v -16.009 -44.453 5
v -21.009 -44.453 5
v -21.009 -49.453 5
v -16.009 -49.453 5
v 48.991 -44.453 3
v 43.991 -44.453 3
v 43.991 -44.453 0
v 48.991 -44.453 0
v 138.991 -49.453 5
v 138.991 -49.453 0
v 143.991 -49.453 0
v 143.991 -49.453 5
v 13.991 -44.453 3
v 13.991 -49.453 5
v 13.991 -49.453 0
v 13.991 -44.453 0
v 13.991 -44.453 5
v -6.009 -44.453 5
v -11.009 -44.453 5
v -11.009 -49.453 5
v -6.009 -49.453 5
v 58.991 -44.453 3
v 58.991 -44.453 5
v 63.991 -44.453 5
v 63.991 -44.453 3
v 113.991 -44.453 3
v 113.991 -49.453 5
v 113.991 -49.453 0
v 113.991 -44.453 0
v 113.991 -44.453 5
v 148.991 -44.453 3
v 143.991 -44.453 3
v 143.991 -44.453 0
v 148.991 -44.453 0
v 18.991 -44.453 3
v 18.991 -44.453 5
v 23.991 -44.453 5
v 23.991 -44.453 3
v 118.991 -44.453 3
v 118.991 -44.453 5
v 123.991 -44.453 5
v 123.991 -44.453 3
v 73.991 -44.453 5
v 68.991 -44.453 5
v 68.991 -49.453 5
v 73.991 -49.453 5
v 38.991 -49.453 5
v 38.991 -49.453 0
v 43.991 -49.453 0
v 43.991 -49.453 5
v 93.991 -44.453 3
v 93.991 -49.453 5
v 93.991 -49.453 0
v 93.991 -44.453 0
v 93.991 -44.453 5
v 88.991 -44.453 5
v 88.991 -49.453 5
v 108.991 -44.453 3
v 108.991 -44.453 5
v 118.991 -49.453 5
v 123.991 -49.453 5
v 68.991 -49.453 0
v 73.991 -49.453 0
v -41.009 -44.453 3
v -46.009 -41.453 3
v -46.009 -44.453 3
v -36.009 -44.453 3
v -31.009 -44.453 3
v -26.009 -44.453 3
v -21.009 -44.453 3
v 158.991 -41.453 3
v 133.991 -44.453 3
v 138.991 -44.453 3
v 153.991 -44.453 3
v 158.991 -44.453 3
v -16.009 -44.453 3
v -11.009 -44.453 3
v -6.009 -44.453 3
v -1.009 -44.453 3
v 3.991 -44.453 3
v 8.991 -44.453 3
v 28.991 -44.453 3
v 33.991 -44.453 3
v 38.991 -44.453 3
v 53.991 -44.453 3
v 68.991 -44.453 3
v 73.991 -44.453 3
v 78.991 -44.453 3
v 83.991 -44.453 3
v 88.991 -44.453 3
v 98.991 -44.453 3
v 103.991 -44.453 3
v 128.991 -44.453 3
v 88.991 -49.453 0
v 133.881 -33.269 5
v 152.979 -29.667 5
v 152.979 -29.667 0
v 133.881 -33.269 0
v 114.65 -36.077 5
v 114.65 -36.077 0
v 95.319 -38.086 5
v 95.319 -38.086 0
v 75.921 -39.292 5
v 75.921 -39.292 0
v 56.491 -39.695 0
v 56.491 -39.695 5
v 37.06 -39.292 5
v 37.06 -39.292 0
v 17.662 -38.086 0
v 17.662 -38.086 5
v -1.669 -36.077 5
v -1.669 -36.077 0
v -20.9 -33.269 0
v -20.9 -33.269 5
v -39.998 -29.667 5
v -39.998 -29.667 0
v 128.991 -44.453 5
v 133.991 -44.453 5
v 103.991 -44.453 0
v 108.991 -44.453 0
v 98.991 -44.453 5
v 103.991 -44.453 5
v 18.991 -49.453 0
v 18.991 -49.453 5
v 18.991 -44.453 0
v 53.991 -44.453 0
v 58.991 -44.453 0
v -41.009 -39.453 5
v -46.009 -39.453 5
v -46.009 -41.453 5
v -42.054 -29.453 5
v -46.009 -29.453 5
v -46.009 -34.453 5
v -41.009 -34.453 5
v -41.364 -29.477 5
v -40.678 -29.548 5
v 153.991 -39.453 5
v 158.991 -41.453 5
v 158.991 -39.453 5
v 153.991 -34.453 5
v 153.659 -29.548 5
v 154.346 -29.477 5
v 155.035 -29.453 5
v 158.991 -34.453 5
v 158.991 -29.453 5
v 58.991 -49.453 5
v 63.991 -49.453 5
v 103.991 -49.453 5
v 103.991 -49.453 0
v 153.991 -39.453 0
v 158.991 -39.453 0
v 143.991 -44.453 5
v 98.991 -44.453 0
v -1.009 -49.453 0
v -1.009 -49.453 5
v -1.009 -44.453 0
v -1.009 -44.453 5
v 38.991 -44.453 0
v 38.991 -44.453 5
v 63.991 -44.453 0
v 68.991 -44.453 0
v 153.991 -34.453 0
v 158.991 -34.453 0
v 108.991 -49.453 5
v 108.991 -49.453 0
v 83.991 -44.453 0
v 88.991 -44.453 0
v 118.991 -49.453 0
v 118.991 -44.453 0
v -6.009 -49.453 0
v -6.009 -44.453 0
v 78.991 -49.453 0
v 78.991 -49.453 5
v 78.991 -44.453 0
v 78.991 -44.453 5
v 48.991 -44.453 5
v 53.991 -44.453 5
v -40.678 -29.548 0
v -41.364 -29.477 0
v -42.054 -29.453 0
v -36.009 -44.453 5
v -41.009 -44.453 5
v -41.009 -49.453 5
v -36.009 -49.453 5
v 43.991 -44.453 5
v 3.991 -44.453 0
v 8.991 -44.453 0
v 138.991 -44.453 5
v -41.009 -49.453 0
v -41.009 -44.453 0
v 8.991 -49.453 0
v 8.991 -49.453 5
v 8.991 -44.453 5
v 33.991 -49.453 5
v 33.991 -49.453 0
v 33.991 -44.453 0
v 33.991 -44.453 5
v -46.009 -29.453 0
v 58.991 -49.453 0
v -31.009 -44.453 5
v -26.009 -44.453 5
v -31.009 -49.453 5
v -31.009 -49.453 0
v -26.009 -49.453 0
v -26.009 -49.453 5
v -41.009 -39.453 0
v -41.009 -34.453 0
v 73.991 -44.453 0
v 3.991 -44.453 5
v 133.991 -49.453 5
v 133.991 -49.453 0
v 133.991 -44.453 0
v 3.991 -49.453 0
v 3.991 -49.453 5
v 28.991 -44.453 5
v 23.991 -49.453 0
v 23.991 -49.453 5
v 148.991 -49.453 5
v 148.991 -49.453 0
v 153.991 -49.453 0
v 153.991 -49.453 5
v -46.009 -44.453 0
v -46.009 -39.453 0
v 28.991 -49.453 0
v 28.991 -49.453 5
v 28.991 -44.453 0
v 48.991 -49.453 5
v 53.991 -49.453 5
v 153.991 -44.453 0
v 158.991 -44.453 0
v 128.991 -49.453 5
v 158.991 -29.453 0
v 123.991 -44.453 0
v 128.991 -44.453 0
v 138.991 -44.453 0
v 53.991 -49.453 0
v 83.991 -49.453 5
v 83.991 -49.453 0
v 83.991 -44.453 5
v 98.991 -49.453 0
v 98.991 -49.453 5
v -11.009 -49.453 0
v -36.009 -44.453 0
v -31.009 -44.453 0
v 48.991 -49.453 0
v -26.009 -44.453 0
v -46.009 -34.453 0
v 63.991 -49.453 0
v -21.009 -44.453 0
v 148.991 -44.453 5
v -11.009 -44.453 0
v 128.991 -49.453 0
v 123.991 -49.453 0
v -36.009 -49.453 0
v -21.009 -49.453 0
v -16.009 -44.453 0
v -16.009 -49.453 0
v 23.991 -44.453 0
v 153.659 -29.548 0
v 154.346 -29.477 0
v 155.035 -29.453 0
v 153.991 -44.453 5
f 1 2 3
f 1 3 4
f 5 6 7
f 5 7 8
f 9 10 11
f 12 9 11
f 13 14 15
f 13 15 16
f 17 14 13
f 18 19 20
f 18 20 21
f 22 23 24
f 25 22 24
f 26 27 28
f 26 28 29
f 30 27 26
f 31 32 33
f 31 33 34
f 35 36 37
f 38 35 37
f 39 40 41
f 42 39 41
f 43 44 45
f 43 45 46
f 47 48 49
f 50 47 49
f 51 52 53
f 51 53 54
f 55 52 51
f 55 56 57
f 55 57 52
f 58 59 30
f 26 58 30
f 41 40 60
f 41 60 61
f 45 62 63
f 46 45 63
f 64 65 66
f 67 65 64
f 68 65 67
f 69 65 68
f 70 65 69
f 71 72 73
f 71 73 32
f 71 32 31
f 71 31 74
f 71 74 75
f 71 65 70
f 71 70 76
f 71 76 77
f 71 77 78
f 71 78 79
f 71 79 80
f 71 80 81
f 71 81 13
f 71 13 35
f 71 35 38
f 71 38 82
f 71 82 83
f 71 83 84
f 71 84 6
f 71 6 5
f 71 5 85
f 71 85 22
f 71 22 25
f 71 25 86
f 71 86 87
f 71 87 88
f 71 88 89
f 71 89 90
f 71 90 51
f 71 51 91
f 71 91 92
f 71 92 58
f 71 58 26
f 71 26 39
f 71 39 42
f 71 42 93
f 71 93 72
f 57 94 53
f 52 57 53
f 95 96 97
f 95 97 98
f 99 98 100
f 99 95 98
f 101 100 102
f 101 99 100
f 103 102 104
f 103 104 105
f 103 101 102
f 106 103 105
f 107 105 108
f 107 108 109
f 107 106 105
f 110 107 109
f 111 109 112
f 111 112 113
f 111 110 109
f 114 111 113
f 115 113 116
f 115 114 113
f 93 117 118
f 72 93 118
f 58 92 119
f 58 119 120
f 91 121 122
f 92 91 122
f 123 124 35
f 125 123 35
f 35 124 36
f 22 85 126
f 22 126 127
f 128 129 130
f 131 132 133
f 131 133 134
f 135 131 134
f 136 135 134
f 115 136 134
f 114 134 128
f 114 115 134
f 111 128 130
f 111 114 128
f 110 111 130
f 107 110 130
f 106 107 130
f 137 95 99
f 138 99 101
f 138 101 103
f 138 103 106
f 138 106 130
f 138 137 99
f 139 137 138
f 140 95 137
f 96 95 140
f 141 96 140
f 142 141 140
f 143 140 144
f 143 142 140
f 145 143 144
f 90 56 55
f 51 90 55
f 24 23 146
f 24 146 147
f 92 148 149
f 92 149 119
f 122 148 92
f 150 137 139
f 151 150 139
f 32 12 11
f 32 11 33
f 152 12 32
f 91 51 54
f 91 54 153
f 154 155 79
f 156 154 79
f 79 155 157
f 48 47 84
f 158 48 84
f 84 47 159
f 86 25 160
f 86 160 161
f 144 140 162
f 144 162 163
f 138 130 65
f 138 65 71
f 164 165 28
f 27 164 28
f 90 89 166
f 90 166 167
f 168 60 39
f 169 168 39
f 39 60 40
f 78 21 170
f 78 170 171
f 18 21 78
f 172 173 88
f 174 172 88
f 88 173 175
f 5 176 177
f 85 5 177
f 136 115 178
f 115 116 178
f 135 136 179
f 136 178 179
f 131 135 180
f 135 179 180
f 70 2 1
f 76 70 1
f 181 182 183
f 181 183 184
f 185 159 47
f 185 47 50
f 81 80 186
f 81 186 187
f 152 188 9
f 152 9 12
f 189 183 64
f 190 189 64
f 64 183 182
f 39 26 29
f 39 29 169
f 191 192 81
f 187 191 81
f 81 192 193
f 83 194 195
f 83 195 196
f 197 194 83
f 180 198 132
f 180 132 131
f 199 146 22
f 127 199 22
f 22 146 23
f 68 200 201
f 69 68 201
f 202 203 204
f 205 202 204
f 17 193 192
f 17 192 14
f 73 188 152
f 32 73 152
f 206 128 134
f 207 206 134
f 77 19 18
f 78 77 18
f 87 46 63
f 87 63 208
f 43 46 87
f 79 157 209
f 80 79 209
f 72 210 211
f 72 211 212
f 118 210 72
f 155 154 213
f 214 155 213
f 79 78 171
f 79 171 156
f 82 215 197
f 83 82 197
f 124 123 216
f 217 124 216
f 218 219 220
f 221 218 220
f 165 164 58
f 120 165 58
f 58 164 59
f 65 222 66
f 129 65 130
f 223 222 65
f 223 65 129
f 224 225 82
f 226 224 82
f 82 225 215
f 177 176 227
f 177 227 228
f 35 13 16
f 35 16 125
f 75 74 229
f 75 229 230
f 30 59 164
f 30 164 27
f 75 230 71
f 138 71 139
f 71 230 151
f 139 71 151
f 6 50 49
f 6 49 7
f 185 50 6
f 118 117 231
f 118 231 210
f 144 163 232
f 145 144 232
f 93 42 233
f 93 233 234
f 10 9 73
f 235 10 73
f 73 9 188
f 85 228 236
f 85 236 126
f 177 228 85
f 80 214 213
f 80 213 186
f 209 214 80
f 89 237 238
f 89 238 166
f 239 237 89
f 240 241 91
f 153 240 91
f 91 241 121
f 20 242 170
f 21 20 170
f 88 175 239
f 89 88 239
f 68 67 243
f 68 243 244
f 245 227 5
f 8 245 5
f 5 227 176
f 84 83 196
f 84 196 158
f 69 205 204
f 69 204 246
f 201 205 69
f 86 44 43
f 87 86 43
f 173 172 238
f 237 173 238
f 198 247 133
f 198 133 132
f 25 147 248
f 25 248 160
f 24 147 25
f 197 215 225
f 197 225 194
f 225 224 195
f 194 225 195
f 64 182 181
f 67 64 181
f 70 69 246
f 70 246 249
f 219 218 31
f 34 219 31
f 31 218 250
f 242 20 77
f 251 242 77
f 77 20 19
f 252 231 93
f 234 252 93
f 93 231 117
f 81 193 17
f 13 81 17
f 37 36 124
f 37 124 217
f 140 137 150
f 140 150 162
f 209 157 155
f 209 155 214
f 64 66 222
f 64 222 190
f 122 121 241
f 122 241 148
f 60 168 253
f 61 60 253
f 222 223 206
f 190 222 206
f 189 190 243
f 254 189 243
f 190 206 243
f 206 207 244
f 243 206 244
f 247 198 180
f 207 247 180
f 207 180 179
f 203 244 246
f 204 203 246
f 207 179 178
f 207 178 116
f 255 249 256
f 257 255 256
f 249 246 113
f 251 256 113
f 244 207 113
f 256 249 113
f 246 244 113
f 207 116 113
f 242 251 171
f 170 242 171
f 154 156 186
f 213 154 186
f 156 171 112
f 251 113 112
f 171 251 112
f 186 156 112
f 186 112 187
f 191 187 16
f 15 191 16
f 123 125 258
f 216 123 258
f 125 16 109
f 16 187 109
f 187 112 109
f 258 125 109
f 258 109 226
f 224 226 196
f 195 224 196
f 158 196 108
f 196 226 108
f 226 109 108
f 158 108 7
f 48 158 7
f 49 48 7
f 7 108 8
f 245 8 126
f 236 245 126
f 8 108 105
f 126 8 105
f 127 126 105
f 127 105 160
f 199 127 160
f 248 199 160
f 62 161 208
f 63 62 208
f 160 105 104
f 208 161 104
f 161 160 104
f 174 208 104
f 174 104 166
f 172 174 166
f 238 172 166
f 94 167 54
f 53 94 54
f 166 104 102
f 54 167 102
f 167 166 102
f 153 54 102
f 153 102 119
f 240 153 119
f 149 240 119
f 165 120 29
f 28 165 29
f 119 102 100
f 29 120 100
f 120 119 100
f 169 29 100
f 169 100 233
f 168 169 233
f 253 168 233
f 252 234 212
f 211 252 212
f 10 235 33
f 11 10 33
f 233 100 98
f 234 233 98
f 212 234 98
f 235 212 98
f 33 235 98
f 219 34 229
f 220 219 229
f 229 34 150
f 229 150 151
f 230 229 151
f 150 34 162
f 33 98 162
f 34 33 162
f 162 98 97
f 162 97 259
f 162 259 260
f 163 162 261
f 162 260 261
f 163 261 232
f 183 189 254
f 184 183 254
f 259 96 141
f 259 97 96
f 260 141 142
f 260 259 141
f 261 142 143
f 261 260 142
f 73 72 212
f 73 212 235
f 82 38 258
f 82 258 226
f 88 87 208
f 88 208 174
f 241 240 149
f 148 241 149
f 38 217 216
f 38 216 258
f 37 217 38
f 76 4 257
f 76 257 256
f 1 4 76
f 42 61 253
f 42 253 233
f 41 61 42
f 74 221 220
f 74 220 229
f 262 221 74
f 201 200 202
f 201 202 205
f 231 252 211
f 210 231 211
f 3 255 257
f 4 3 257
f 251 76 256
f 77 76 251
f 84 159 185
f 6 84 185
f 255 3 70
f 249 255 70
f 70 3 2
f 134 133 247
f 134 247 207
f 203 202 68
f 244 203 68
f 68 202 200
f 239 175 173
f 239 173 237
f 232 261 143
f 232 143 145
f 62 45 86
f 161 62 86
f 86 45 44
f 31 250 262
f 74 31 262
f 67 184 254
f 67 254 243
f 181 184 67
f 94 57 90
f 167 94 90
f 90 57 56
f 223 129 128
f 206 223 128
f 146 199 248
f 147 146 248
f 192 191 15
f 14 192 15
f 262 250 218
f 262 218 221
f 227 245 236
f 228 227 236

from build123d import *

# Parameters (mm, degrees)
ESQUISSE1_W             = 205
ESQUISSE1_H             = 20
BOSS_EXTRU_1_DEPTH      = 5
ESQUISSE2_W             = 5
ESQUISSE2_H             = 5
ENL_V_MAT_EXTRU_2_DEPTH = 5
ESQUISSE3_W             = 205
ESQUISSE3_H             = 3
ENL_V_MAT_EXTRU_3_DEPTH = 2
CONG_2_R                = 10
CONG_3_R                = 10


with BuildPart() as part:
    # Esquisse1 → Boss.-Extru.1 (new body)
    with BuildSketch(Plane.XY):
        with Locations((56.490511124, -39.453030303)):
            Rectangle(ESQUISSE1_W, ESQUISSE1_H)
    extrude(amount=BOSS_EXTRU_1_DEPTH)

    # Esquisse2 → Enlèv. mat.-Extru.2 (cut)
    with BuildSketch(Plane.XY.offset(5)):
        with Locations((146.490511124, -46.953030303)):
            Rectangle(ESQUISSE2_W, ESQUISSE2_H)
        with Locations((156.490511124, -46.953030303)):
            Rectangle(ESQUISSE2_W, ESQUISSE2_H)
        with Locations((136.490511124, -46.953030303)):
            Rectangle(ESQUISSE2_W, ESQUISSE2_H)
        with Locations((126.490511124, -46.953030303)):
            Rectangle(ESQUISSE2_W, ESQUISSE2_H)
        with Locations((116.490511124, -46.953030303)):
            Rectangle(ESQUISSE2_W, ESQUISSE2_H)
        with Locations((106.490511124, -46.953030303)):
            Rectangle(ESQUISSE2_W, ESQUISSE2_H)
        with Locations((96.490511124, -46.953030303)):
            Rectangle(ESQUISSE2_W, ESQUISSE2_H)
        with Locations((86.490511124, -46.953030303)):
            Rectangle(ESQUISSE2_W, ESQUISSE2_H)
        with Locations((76.490511124, -46.953030303)):
            Rectangle(ESQUISSE2_W, ESQUISSE2_H)
        with Locations((66.490511124, -46.953030303)):
            Rectangle(ESQUISSE2_W, ESQUISSE2_H)
        with Locations((56.490511124, -46.953030303)):
            Rectangle(ESQUISSE2_W, ESQUISSE2_H)
        with Locations((46.490511124, -46.953030303)):
            Rectangle(ESQUISSE2_W, ESQUISSE2_H)
        with Locations((36.490511124, -46.953030303)):
            Rectangle(ESQUISSE2_W, ESQUISSE2_H)
        with Locations((26.490511124, -46.953030303)):
            Rectangle(ESQUISSE2_W, ESQUISSE2_H)
        with Locations((16.490511124, -46.953030303)):
            Rectangle(ESQUISSE2_W, ESQUISSE2_H)
        with Locations((6.490511124, -46.953030303)):
            Rectangle(ESQUISSE2_W, ESQUISSE2_H)
        with Locations((-3.509488876, -46.953030303)):
            Rectangle(ESQUISSE2_W, ESQUISSE2_H)
        with Locations((-13.509488876, -46.953030303)):
            Rectangle(ESQUISSE2_W, ESQUISSE2_H)
        with Locations((-23.509488876, -46.953030303)):
            Rectangle(ESQUISSE2_W, ESQUISSE2_H)
        with Locations((-33.509488876, -46.953030303)):
            Rectangle(ESQUISSE2_W, ESQUISSE2_H)
        with Locations((156.490511124, -36.953030303)):
            Rectangle(ESQUISSE2_W, ESQUISSE2_H)
        with BuildLine():
            Line((-41.009488876, -29.453030303), (153.990511124, -29.453030303))
            ThreePointArc((153.990511124, -29.453030303), (56.490511124, -39.694920166), (-41.009488876, -29.453030303))
        make_face()
        with Locations((-43.509488876, -46.953030303)):
            Rectangle(ESQUISSE2_W, ESQUISSE2_H)
        with Locations((-43.509488876, -36.953030303)):
            Rectangle(ESQUISSE2_W, ESQUISSE2_H)
    extrude(amount=-ENL_V_MAT_EXTRU_2_DEPTH, mode=Mode.SUBTRACT)

    # Esquisse3 → Enlèv. mat.-Extru.3 (cut)
    with BuildSketch(Plane.XY.offset(5)):
        with Locations((56.490511124, -42.953030303)):
            Rectangle(ESQUISSE3_W, ESQUISSE3_H)
    extrude(amount=-ENL_V_MAT_EXTRU_3_DEPTH, mode=Mode.SUBTRACT)

    # Congé2
    cong_2_edges = [part.edges().sort_by_distance(p)[0] for p in [
        (153.990511124, -29.453030303, 2.5),
    ]]
    fillet(cong_2_edges, radius=CONG_2_R)

    # Congé3
    cong_3_edges = [part.edges().sort_by_distance(p)[0] for p in [
        (-41.009488876, -29.453030303, 2.5),
    ]]
    fillet(cong_3_edges, radius=CONG_3_R)


solid = part.part
